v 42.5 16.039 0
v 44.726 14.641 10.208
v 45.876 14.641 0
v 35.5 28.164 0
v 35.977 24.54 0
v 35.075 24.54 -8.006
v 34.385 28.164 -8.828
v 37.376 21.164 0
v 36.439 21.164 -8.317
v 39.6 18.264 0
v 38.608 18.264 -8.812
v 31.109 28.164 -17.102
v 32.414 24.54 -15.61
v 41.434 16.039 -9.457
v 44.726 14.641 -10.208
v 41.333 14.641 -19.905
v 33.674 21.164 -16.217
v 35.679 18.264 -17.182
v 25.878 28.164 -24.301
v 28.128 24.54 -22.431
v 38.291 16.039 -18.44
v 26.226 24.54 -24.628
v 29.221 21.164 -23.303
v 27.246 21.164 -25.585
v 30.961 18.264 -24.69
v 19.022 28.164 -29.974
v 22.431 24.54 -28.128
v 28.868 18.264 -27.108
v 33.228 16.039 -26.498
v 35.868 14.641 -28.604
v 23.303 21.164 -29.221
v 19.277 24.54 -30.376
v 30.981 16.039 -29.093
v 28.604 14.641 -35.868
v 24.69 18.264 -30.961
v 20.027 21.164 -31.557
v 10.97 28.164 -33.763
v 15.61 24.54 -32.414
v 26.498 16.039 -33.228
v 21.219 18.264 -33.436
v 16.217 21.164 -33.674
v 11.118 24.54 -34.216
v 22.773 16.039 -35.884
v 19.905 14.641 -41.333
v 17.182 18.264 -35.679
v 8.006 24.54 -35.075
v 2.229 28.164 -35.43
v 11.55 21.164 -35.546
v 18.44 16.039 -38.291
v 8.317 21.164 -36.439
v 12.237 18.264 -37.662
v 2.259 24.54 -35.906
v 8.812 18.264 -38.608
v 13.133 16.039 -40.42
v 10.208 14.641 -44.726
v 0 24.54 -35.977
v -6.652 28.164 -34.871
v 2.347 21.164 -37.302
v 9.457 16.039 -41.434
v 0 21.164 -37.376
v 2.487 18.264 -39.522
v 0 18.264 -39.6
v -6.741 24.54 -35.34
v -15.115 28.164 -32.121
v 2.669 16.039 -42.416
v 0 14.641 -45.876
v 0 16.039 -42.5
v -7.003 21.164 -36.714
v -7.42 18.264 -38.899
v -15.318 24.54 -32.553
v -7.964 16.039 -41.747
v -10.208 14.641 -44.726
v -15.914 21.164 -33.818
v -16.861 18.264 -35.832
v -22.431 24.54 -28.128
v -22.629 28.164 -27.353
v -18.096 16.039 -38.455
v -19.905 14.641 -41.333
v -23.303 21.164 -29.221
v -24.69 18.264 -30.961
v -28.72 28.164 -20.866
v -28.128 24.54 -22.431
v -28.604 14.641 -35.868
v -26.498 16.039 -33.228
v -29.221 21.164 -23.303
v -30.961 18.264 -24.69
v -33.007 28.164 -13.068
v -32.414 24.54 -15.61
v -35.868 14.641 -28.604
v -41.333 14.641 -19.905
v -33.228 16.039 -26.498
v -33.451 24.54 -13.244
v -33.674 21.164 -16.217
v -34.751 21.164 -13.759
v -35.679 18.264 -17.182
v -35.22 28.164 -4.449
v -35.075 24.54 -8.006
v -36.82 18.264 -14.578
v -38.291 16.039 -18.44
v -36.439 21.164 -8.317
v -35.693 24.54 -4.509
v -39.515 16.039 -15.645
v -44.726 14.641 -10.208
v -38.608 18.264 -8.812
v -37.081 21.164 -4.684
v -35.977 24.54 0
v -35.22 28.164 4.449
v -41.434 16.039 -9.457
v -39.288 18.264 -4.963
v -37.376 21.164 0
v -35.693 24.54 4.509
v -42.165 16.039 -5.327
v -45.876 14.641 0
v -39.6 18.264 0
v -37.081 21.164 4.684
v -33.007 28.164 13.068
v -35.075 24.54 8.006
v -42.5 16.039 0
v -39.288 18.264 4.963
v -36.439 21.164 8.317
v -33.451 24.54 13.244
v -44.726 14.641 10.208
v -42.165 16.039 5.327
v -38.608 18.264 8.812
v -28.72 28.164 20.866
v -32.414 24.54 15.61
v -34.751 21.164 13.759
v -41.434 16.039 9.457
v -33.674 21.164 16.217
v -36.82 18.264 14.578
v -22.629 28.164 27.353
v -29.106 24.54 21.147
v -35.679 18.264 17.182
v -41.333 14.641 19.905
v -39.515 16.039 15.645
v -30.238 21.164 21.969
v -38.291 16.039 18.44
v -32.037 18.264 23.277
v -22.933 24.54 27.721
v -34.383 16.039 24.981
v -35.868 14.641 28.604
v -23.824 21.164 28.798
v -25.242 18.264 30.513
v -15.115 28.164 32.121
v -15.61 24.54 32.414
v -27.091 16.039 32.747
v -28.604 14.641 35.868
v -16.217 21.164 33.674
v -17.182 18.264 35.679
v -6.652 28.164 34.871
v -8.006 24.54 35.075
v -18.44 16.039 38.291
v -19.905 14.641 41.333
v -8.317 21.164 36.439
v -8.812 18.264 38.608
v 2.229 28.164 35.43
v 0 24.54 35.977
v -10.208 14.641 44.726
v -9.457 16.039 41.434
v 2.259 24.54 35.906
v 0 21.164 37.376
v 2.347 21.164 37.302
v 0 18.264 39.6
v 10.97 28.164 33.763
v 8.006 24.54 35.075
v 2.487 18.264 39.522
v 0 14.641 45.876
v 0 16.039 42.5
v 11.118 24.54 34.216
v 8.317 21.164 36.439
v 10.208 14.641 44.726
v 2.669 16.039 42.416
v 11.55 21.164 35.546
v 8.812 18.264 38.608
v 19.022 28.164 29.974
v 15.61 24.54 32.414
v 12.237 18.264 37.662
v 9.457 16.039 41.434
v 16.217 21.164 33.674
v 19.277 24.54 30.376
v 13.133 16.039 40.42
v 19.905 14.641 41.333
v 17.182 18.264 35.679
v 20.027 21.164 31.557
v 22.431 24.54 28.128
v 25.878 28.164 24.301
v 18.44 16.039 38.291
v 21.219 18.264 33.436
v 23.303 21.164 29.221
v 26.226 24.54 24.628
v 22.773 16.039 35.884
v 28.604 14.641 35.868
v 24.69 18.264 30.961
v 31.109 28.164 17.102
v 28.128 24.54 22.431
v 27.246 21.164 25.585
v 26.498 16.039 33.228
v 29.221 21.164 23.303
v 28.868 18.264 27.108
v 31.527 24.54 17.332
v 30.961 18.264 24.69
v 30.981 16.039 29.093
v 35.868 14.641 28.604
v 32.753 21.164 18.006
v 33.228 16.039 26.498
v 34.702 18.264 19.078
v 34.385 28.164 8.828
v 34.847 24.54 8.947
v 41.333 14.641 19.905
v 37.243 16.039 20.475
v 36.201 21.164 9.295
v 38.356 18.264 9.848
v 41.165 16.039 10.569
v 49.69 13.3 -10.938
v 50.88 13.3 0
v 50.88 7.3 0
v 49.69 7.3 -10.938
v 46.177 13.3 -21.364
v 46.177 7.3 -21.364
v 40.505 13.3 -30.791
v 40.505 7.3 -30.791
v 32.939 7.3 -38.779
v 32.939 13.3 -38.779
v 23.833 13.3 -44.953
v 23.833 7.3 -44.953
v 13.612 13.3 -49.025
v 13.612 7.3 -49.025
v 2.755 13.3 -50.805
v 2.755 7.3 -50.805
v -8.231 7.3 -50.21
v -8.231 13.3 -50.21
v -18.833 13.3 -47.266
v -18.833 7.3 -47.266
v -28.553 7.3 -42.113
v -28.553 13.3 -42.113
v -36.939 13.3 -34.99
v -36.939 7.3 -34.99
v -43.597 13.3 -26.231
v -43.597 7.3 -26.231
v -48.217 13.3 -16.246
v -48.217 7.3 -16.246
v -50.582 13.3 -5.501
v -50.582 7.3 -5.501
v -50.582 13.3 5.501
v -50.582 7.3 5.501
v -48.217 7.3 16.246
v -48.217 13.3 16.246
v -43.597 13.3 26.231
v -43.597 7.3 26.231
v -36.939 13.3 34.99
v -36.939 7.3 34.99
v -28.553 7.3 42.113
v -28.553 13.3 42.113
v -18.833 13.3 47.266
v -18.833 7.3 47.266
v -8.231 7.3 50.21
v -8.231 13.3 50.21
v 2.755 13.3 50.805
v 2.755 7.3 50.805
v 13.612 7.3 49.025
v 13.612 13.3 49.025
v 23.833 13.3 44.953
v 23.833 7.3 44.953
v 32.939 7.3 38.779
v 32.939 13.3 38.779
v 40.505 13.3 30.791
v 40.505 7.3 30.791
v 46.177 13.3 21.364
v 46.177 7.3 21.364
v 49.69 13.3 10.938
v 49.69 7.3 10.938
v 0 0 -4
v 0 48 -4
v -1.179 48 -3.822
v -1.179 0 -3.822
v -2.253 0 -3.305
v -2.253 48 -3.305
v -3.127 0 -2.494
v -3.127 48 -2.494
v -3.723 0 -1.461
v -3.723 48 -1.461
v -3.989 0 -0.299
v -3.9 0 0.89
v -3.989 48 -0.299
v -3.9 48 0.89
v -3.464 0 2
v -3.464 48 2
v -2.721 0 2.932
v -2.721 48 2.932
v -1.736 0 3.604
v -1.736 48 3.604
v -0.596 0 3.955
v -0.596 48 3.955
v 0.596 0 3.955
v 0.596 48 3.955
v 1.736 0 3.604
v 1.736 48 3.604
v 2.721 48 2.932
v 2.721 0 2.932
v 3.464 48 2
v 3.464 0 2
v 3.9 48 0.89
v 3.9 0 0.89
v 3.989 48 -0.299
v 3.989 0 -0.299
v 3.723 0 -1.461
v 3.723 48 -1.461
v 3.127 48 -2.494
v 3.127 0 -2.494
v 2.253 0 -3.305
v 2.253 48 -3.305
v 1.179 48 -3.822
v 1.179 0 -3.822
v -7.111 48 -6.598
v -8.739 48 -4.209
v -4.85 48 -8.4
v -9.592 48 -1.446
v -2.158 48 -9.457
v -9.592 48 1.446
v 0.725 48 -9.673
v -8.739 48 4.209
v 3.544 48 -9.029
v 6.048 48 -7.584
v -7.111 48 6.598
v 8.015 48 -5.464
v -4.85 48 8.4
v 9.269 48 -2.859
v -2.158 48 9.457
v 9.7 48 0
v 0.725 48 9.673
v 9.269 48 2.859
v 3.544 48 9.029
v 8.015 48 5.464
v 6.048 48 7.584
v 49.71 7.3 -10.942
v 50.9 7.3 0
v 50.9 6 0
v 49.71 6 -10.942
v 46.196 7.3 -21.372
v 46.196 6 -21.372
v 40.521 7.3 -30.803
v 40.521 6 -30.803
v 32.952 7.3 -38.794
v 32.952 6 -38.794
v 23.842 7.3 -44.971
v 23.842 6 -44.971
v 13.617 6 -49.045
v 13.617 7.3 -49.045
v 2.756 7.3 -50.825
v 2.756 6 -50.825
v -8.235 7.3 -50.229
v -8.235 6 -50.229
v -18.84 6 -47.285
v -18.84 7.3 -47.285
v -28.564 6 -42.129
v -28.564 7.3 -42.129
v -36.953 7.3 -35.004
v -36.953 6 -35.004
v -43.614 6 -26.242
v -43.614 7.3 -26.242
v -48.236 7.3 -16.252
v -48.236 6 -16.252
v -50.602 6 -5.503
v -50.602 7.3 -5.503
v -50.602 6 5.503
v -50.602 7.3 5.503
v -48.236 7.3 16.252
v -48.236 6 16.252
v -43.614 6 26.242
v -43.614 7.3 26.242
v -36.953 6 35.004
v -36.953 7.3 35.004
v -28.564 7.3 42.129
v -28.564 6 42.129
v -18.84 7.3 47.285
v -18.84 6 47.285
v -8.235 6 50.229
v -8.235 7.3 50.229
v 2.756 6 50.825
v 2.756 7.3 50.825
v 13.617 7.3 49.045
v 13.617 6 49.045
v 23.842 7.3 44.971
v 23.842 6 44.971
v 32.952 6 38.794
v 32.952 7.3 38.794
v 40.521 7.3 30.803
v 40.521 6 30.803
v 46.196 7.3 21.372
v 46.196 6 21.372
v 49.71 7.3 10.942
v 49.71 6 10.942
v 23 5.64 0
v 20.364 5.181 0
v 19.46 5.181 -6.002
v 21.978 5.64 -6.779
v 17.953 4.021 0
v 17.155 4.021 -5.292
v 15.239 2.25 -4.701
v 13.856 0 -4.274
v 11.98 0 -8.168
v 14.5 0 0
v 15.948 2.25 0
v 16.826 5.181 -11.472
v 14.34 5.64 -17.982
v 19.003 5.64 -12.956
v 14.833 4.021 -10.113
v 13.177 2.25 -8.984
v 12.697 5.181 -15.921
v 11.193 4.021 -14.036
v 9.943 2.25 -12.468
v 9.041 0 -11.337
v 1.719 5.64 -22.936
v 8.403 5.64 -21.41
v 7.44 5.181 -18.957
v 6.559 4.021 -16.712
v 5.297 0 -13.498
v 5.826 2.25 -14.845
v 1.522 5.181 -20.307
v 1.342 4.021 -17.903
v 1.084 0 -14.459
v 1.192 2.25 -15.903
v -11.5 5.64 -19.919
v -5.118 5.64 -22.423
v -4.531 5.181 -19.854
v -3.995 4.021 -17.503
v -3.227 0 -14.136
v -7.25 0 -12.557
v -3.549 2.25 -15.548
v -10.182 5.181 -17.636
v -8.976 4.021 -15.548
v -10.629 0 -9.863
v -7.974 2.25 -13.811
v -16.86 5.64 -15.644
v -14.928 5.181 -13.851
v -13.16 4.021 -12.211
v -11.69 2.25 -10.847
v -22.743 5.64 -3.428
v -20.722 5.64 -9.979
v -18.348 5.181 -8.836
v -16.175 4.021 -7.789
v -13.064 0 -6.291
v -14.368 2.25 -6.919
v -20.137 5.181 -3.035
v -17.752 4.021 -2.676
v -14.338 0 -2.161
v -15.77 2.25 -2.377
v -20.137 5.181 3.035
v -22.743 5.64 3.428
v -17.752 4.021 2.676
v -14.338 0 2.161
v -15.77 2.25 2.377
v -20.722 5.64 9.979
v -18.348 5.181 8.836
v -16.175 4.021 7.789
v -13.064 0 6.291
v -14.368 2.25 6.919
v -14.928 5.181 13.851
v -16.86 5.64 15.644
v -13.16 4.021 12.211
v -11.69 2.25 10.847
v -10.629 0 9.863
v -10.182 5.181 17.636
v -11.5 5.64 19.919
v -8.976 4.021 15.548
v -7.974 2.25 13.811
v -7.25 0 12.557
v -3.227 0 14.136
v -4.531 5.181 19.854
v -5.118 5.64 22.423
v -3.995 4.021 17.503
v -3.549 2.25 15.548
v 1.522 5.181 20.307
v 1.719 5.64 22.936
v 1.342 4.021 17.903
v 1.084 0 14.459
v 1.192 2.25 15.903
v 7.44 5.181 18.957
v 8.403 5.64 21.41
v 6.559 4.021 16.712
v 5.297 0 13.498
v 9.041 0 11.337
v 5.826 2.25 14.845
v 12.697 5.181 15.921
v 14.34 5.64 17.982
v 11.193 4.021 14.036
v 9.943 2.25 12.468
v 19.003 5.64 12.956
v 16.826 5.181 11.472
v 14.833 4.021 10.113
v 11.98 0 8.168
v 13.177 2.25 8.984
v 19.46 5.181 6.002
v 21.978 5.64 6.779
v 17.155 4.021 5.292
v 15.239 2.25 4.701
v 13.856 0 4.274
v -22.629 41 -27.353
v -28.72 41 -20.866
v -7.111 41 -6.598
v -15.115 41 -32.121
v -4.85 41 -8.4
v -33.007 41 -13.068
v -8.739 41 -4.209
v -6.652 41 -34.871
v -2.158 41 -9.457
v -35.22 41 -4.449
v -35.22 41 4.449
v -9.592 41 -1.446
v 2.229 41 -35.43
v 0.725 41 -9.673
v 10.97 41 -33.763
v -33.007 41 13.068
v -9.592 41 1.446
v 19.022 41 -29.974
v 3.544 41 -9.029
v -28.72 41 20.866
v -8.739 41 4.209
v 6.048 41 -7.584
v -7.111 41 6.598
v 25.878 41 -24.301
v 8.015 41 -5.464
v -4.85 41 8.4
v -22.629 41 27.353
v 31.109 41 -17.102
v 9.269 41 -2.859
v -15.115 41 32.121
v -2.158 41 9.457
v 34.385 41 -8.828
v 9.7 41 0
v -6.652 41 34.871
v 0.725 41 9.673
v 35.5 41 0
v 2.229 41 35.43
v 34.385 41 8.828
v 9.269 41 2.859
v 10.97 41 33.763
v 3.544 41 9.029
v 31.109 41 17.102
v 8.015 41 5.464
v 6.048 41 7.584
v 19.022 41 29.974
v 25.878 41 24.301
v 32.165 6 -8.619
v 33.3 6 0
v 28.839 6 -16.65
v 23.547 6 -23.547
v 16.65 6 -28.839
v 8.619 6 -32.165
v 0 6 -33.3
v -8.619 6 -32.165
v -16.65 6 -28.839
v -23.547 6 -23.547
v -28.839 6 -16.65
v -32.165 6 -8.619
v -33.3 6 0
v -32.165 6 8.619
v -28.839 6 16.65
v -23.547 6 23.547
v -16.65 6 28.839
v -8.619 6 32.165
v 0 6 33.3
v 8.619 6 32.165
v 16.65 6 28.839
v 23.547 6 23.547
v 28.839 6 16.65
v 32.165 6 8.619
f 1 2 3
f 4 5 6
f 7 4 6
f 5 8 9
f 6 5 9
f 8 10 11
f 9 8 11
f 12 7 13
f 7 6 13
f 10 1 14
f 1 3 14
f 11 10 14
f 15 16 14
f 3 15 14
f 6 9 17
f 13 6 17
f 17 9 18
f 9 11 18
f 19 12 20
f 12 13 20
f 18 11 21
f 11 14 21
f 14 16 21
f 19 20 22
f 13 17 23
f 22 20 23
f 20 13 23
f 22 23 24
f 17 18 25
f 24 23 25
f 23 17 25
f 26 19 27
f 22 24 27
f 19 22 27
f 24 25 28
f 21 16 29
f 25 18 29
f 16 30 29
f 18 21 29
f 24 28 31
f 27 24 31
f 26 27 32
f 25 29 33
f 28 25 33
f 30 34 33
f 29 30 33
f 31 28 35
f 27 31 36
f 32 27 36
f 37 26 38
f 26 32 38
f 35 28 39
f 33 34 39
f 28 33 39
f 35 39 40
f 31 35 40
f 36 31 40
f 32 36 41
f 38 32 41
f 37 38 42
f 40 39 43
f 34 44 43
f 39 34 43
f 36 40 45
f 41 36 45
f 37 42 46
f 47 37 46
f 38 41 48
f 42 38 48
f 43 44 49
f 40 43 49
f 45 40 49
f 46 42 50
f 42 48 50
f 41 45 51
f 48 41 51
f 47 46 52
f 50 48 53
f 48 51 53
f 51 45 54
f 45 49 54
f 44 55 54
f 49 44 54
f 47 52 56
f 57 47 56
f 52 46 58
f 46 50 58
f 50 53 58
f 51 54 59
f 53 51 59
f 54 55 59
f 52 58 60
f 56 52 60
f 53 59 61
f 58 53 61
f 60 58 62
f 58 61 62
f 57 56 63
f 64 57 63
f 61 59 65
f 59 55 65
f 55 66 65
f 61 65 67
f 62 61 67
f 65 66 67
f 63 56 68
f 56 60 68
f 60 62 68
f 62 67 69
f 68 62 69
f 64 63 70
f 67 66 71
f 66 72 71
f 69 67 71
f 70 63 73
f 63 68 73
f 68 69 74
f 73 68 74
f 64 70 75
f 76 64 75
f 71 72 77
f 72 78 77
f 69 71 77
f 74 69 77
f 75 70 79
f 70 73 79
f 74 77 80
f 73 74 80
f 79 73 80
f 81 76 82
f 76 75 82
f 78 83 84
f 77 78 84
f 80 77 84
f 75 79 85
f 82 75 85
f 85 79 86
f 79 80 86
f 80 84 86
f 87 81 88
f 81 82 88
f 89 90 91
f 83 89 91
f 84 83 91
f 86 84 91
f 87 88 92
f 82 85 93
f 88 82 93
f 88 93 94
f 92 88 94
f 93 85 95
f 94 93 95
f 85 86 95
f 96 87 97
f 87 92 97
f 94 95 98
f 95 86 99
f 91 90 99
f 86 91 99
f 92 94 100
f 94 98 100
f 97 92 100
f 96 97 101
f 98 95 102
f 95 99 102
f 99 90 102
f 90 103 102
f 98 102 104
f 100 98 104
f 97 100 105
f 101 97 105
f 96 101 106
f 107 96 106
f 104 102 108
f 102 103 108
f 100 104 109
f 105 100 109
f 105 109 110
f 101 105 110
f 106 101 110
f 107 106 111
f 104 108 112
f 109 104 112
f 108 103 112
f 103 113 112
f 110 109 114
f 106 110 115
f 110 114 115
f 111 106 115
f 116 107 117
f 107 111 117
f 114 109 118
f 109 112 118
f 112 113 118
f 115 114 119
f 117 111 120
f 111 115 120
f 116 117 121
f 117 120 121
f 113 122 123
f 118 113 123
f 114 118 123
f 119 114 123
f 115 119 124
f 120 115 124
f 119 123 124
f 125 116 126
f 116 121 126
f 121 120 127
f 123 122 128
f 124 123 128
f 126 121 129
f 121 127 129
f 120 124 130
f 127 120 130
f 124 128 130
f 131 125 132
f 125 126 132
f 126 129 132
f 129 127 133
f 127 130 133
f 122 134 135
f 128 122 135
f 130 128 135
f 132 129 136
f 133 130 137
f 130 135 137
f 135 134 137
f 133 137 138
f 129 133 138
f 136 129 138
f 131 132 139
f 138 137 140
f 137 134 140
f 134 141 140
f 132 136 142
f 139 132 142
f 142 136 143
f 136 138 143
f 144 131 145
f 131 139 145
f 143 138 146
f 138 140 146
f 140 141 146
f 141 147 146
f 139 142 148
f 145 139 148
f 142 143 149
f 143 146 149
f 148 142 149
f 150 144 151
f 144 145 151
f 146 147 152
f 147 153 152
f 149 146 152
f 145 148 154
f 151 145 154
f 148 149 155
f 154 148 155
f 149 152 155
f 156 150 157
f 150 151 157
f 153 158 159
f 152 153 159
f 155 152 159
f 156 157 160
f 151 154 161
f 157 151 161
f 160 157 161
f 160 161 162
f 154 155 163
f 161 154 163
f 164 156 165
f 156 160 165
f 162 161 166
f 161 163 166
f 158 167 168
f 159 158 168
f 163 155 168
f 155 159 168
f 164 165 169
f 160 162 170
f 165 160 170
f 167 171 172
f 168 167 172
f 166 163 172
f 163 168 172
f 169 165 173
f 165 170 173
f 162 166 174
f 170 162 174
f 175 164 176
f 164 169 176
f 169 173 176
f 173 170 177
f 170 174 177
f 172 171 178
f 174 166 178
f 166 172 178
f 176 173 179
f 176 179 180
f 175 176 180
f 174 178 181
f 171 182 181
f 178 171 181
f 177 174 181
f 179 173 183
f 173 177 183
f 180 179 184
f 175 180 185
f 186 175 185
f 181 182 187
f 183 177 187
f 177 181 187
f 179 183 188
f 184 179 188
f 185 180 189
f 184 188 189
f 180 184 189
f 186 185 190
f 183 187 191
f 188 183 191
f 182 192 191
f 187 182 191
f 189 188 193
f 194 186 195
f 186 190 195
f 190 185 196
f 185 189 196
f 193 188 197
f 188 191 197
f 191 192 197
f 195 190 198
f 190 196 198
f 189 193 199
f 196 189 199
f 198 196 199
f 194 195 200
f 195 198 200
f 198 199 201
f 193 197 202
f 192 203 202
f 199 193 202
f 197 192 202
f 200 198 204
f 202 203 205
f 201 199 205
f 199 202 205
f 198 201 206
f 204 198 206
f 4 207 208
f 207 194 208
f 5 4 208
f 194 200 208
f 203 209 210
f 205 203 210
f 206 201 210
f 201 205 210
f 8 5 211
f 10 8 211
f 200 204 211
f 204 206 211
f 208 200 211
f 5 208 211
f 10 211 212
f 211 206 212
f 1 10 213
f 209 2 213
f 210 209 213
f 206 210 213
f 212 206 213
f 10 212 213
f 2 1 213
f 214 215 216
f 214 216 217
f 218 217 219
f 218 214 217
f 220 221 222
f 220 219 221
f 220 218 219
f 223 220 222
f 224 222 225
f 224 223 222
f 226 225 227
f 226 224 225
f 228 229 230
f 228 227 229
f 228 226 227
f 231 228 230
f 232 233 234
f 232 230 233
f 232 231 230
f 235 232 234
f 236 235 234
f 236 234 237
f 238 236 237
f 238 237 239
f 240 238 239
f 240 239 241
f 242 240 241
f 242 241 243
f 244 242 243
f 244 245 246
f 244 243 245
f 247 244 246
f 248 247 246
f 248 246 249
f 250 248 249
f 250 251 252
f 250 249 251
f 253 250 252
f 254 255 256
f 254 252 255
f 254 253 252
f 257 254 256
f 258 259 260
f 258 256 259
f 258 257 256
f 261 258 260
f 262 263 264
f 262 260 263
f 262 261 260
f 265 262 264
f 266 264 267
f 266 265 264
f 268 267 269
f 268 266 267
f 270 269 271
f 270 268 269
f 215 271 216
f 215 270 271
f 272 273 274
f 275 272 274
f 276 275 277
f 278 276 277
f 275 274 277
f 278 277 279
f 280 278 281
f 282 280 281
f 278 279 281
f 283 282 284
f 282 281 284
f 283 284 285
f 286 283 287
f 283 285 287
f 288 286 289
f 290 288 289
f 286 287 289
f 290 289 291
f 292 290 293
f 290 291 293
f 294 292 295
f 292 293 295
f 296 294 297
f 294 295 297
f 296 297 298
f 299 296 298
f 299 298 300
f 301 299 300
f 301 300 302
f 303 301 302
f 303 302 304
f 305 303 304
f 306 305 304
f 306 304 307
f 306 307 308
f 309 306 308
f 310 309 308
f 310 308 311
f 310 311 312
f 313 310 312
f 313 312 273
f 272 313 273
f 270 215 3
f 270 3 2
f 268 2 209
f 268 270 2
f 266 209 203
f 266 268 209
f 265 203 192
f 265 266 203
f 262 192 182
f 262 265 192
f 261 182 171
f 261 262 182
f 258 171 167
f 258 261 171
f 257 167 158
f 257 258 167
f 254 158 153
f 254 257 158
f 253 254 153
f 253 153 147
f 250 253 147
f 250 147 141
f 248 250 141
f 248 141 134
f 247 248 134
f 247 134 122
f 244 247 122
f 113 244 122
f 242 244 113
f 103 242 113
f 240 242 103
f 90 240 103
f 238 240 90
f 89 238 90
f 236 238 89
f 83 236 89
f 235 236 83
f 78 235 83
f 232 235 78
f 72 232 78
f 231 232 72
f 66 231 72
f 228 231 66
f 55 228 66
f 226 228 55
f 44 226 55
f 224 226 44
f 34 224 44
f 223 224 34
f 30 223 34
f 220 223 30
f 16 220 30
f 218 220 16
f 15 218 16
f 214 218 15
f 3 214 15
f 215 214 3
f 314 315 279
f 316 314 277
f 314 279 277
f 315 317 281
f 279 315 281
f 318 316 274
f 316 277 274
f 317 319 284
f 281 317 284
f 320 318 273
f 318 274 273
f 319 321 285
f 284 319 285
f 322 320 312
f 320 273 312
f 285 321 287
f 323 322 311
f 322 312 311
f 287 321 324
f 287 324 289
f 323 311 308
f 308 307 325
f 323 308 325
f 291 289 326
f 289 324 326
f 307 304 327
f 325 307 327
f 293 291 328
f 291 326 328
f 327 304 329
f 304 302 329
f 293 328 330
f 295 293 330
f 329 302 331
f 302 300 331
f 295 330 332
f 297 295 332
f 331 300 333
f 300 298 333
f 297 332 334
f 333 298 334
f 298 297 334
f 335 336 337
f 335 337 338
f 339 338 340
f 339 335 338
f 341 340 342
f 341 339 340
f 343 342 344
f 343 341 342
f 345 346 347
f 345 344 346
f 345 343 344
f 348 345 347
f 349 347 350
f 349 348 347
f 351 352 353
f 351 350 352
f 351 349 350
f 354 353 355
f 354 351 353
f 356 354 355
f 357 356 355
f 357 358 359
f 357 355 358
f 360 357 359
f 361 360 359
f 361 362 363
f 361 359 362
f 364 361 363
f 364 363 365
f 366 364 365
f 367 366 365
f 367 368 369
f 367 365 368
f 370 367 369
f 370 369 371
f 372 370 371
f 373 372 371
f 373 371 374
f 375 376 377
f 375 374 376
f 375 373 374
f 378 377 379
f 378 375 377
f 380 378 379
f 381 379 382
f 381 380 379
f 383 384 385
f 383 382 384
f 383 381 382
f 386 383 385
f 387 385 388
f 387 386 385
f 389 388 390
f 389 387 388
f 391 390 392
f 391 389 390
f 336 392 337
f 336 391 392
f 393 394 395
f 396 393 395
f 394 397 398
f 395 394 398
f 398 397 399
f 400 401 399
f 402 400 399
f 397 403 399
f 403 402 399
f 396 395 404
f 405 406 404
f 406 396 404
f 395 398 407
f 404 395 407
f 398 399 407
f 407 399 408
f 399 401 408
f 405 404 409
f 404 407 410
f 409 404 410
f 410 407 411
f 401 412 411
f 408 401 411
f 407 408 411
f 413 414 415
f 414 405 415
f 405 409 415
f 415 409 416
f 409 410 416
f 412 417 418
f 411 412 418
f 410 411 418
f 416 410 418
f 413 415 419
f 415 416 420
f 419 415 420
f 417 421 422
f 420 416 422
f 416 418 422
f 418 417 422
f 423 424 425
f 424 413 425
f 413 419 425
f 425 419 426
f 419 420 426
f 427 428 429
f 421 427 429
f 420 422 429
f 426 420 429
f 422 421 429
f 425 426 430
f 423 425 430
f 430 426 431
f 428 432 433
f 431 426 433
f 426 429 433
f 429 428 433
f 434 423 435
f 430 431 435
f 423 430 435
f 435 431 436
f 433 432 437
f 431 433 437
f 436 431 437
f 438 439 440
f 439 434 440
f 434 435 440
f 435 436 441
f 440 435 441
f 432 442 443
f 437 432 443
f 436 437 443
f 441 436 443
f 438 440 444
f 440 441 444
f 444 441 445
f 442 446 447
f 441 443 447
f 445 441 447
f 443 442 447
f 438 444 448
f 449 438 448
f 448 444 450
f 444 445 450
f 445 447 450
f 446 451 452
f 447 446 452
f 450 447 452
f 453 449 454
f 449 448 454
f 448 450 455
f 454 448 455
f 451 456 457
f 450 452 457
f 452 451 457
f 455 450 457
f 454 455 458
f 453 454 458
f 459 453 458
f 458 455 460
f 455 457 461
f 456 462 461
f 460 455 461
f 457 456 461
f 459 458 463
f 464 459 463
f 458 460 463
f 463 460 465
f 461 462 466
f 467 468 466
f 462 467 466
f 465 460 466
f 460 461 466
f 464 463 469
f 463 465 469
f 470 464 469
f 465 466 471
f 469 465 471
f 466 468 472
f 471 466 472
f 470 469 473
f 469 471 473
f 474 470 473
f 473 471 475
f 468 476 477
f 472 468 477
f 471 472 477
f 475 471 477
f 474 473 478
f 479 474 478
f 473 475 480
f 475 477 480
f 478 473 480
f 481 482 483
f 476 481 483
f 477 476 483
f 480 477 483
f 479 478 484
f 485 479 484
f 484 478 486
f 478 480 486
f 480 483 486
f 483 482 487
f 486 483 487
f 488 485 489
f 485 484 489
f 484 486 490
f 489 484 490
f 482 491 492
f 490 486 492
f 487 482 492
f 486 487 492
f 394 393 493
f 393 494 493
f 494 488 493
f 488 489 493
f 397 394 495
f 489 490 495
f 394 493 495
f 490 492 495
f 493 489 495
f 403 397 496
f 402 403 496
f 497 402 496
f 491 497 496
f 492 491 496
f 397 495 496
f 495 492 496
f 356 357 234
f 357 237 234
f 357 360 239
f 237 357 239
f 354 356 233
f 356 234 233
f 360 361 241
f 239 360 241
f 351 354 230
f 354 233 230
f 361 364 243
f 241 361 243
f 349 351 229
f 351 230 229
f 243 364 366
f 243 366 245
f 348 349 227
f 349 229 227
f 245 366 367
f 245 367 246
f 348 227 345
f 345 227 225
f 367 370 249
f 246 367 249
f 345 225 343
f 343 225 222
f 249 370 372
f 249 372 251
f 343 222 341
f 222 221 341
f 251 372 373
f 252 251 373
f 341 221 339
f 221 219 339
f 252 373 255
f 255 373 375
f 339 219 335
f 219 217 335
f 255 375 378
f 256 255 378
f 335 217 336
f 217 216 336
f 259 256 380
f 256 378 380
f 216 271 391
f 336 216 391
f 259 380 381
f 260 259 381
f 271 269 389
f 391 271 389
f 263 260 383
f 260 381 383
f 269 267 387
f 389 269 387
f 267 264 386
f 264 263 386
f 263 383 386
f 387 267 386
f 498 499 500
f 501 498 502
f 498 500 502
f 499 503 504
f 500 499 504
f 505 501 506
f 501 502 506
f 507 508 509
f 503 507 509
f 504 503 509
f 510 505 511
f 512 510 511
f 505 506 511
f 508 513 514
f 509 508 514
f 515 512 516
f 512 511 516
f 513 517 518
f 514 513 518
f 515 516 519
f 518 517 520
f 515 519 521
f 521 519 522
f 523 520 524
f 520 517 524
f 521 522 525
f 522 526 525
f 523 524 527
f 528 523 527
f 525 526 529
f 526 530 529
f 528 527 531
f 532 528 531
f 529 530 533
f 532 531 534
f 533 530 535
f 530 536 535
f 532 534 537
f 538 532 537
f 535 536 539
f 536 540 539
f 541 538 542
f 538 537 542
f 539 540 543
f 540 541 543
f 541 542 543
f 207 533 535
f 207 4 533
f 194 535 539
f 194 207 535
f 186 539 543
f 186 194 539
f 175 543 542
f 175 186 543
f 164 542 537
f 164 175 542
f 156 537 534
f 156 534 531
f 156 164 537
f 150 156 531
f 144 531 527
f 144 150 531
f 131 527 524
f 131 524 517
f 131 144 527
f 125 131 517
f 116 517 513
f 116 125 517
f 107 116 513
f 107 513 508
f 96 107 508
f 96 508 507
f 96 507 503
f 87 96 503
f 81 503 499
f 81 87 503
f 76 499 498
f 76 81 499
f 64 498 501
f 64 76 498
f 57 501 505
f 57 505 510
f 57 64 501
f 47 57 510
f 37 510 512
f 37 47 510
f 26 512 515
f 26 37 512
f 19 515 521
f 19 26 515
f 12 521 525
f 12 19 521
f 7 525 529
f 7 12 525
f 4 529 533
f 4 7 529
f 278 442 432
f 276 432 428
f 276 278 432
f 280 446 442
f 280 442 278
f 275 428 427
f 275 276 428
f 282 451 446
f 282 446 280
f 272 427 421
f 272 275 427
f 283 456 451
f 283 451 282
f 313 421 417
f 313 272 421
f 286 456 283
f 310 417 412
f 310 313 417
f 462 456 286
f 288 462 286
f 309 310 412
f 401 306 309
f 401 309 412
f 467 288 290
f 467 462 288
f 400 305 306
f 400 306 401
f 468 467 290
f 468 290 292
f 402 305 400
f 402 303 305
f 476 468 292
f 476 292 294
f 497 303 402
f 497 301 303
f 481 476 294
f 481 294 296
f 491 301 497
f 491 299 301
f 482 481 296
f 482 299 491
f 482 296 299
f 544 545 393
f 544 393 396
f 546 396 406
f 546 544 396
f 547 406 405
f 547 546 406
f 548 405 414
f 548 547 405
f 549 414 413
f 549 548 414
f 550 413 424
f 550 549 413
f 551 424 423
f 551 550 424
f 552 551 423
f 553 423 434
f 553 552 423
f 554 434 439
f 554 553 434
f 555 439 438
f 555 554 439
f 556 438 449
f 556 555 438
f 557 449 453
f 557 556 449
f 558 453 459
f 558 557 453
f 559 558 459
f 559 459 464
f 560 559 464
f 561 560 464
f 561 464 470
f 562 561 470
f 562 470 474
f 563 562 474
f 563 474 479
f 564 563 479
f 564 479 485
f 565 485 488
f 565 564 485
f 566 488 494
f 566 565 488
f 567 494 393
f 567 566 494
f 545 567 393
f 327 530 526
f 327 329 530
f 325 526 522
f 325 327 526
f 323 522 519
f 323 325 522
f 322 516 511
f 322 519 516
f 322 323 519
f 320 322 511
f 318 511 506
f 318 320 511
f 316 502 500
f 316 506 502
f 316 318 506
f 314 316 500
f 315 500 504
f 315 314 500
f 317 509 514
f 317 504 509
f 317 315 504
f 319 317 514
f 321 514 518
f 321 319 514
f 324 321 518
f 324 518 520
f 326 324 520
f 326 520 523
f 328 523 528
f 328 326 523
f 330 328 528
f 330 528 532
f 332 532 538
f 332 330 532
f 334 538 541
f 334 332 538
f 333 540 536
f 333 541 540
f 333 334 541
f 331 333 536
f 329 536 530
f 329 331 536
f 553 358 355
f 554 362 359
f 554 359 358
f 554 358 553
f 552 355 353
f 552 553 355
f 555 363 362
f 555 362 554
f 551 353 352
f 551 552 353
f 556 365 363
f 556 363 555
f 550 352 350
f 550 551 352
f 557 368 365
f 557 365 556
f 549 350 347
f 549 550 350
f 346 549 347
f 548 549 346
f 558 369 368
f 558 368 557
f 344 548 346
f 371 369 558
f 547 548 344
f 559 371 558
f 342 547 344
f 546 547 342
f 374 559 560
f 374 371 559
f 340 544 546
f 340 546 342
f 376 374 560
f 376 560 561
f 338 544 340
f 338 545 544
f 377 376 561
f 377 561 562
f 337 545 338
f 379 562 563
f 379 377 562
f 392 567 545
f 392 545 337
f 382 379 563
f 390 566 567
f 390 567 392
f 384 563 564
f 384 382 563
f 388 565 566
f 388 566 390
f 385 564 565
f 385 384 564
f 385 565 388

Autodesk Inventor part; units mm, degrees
ref_plane "YZ Plane" through (0, 0, 0) normal (1, 0, 0) x (0, 1, 0)
ref_plane "XZ Plane" through (0, 0, 0) normal (0, 1, 0) x (-1, 0, 0)
ref_plane "XY Plane" through (0, 0, 0) normal (0, 0, 1) x (1, 0, 0)
sketch "Skizze5" plane through (0, 0, 0) normal (0, 0, 1) x (1, 0, 0)
  line L0 (0, 0) -> (14.5, 0)
  line L1 (33.3, 6) -> (50.9, 6)
  line L2 (33.3, 6) -> (23, 5.6403)
  arc A0 (23, 5.6403) -> (14.5, 0) centre (23.34, -4.0971) ccw
  line L3 (50.9, 6) -> (50.9, 7.3)
  line L4 (50.9, 7.3) -> (50.88, 7.3)
  line L5 (50.88, 7.3) -> (50.88, 13.3)
  line L6 (0, 0) -> (9.7, 0)
  line L7 (9.7, 0) -> (9.7, 48)
  line L8 (9.7, 48) -> (0, 48)
  line L9 (0, 48) -> (0, 0)
  line L10 (9.7, 48) -> (9.7, 41)
  line L11 (9.7, 41) -> (35.5, 41)
  line L12 (35.5, 41) -> (35.5, 17.4211)
  line L13 (50.88, 13.3) -> (35.5, 17.4211)
  arc A1 (35.5, 28.1636) -> (45.8765, 14.6407) centre (49.5, 28.1636) ccw
  line L14 (50.88, 13.3) -> (35.0608, 13.3)
  dimension "d21" = 14.5
  dimension "d22" = 50.9
  dimension "d23" = 6
  dimension "d24" = 33.3
  dimension "d25" = 23
  dimension "d26" = 2
  dimension "d28" = 1.3
  dimension "d29" = 0.02
  dimension "d30" = 6
  dimension "d31" = 9.7
  dimension "d32" = 48
  dimension "d33" = 7
  dimension "d47" = 25.8
  dimension "d48" = 35.5
  dimension "d49" = 105
  dimension "d53" = 14
  dimension "d54" = 15
  dimension "d55" = 35
revolve "Umdrehung1" add sketch "Skizze5" angle 360 about axis through (0, 48, 0) along (0, -1, 0)
sketch "Skizze6" plane through (0, 0, 0) normal (0, -1, 0) x (1, 0, 0)
  circle A0 centre (0, 0) radius 14.5 projected
hole "Hole2" at (0, 0, 0) direction (0, 1, 0) diameter 8 end through all
